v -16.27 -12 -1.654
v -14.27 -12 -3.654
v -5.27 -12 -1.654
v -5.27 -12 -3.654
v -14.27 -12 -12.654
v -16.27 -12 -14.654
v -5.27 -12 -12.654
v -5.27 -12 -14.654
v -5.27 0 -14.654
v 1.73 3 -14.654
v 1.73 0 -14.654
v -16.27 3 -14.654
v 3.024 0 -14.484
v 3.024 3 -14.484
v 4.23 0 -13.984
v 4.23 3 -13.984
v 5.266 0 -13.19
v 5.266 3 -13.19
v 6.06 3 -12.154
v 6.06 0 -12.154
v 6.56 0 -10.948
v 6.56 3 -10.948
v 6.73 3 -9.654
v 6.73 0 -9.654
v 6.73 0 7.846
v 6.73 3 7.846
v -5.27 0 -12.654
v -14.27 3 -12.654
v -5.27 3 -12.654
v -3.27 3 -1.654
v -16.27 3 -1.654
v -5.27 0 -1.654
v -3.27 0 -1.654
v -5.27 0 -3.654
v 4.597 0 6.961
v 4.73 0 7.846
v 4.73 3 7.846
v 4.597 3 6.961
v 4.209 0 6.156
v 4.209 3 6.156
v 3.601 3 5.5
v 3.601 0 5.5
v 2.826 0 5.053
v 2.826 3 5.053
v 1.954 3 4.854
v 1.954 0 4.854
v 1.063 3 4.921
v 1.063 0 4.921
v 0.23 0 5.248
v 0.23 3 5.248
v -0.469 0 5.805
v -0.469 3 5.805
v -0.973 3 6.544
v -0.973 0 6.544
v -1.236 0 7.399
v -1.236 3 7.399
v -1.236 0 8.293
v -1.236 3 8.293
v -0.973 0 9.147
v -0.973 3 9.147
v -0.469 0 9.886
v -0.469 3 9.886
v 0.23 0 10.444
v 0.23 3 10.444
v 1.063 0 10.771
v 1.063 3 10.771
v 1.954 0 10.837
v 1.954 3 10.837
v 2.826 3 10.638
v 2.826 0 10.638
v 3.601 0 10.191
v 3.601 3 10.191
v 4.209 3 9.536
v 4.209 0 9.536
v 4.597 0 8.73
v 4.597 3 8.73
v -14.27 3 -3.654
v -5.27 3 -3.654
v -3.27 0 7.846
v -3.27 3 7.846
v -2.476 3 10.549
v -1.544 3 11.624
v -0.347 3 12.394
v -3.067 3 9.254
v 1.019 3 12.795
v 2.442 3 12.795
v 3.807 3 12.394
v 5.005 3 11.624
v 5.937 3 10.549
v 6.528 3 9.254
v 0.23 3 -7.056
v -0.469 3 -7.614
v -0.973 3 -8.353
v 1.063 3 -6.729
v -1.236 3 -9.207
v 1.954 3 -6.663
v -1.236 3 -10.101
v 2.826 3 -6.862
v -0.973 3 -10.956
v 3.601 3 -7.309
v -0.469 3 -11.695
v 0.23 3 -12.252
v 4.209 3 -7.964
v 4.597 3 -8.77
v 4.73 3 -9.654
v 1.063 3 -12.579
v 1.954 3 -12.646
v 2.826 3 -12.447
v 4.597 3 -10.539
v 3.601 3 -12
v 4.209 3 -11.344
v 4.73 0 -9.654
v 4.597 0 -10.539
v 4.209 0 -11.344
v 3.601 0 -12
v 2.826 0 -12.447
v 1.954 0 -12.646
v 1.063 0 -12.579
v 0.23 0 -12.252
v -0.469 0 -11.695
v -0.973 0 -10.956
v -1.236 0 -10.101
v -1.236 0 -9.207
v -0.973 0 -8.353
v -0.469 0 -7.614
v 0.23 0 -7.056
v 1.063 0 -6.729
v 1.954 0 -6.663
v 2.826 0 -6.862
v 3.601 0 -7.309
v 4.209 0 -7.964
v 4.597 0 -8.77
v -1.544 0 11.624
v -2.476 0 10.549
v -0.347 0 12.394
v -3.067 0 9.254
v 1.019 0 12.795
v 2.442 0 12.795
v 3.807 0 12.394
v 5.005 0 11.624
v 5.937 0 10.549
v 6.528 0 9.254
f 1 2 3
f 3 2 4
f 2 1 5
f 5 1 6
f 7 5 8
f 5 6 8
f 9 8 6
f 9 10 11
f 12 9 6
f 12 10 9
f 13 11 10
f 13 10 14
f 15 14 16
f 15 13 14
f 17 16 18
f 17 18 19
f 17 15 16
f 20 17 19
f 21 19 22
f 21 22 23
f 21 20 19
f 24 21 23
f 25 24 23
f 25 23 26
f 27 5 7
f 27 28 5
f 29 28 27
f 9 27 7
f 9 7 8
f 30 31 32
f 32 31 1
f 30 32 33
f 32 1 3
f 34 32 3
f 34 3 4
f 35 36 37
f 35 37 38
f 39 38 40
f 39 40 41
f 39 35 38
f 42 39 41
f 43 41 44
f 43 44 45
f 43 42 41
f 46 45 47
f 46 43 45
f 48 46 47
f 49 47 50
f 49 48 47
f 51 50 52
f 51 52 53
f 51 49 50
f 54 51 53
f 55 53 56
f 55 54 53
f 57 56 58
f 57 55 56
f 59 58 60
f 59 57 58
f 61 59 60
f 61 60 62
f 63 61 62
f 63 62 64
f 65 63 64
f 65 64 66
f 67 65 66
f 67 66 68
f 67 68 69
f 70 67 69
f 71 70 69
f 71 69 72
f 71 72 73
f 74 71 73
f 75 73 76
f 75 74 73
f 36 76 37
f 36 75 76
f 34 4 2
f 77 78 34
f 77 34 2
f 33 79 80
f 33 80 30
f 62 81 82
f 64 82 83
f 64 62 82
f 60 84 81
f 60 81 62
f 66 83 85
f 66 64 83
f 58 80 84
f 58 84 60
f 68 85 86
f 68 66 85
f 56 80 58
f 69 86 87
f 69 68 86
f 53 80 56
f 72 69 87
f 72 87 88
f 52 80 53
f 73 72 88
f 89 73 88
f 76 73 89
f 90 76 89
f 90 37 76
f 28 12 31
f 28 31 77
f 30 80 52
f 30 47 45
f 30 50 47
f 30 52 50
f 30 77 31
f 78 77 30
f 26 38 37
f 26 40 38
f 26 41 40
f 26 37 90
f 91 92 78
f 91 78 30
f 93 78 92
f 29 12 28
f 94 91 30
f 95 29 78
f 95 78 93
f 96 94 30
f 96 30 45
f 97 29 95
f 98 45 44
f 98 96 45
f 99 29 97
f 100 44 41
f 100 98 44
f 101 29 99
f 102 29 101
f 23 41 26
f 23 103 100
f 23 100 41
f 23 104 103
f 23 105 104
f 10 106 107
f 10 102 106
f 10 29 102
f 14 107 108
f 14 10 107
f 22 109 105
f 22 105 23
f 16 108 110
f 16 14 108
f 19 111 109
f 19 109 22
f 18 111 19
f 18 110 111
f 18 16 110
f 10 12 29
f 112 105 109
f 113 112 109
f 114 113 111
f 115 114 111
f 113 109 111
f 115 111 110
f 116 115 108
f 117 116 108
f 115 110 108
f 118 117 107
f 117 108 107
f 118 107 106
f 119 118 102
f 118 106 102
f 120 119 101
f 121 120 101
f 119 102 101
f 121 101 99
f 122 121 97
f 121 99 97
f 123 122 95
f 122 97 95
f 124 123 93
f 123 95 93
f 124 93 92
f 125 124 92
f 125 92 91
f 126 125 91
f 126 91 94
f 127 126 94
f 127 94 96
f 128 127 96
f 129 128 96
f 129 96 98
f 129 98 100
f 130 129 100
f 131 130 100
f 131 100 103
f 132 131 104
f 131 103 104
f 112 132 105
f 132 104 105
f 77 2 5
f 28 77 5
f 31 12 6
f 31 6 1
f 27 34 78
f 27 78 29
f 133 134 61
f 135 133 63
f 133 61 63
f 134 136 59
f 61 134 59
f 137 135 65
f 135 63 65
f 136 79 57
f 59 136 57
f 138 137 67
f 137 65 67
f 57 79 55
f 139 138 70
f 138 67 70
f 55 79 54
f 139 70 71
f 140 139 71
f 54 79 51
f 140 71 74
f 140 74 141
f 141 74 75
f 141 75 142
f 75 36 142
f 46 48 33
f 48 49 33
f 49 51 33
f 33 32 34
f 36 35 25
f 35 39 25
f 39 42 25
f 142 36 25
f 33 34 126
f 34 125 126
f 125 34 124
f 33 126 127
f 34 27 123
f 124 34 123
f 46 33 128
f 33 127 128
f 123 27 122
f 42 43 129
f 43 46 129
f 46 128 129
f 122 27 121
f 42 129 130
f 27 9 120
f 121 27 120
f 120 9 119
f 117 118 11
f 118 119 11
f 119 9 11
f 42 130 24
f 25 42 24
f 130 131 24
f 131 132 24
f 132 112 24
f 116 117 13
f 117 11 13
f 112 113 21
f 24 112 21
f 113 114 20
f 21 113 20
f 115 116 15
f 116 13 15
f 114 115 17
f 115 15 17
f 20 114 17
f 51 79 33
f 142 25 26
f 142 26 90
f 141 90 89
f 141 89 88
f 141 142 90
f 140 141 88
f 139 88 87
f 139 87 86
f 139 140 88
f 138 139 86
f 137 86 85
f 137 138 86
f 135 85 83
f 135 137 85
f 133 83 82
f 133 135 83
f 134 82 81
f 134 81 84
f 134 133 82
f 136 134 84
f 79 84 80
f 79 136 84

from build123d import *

# Parameters (mm, degrees)
SKETCH1_R           = 3
BOSS_EXTRUDE1_DEPTH = 3
SKETCH2_R           = 3
CUT_EXTRUDE1_DEPTH  = 3
SKETCH3_W           = 9
SKETCH3_H           = 9
BOSS_EXTRUDE2_DEPTH = 3
BOSS_EXTRUDE3_DEPTH = 12


with BuildPart() as part:
    # Sketch1 → Boss-Extrude1 (new body)
    with BuildSketch(Plane(origin=(0, 0, 0), x_dir=(1, 0, 0), z_dir=(0, 1, 0))):
        with BuildLine():
            Line((-3.269734365, -7.845727727), (-3.269734365, 9.654272273))
            ThreePointArc((-3.269734365, 9.654272273), (1.730265635, 14.654272273), (6.730265635, 9.654272273))
            Line((6.730265635, 9.654272273), (6.730265635, -7.845727727))
            ThreePointArc((6.730265635, -7.845727727), (1.730265635, -12.845727727), (-3.269734365, -7.845727727))
        make_face()
        with Locations((1.730265635, -7.845727727)):
            Circle(SKETCH1_R, mode=Mode.SUBTRACT)
    extrude(amount=BOSS_EXTRUDE1_DEPTH)

    # Sketch2 → Cut-Extrude1 (cut)
    with BuildSketch(Plane(origin=(0, 3, 0), x_dir=(1, 0, 0), z_dir=(0, 1, 0))):
        with Locations((1.730265635, 9.654272273)):
            Circle(SKETCH2_R)
    extrude(amount=-CUT_EXTRUDE1_DEPTH, mode=Mode.SUBTRACT)

    # Sketch3 → Boss-Extrude2 (add)
    with BuildSketch(Plane(origin=(0, 0, 0), x_dir=(-1, 0, 0), z_dir=(0, -1, 0))):
        with BuildLine():
            Line((-1.730265635, 14.654272273), (16.269734365, 14.654272273))
            Line((16.269734365, 14.654272273), (16.269734365, 1.654272273))
            Line((16.269734365, 1.654272273), (3.269734365, 1.654272273))
            Line((3.269734365, 1.654272273), (3.269734365, 9.654272273))
            ThreePointArc((3.269734365, 9.654272273), (1.805268271, 13.189806179), (-1.730265635, 14.654272273))
        make_face()
        with Locations((9.769734365, 8.154272273)):
            Rectangle(SKETCH3_W, SKETCH3_H, mode=Mode.SUBTRACT)
    extrude(amount=-BOSS_EXTRUDE2_DEPTH)

    # Sketch4 → Boss-Extrude3 (add)
    with BuildSketch(Plane(origin=(0, 0, 0), x_dir=(-1, 0, 0), z_dir=(0, -1, 0))):
        Polygon((5.269734365, 12.654272273), (5.269734365, 14.654272273), (16.269734365, 14.654272273), (16.269734365, 1.654272273), (5.269734365, 1.654272273), (5.269734365, 3.654272273), (14.269734365, 3.654272273), (14.269734365, 12.654272273), align=None)
    extrude(amount=BOSS_EXTRUDE3_DEPTH)


solid = part.part
